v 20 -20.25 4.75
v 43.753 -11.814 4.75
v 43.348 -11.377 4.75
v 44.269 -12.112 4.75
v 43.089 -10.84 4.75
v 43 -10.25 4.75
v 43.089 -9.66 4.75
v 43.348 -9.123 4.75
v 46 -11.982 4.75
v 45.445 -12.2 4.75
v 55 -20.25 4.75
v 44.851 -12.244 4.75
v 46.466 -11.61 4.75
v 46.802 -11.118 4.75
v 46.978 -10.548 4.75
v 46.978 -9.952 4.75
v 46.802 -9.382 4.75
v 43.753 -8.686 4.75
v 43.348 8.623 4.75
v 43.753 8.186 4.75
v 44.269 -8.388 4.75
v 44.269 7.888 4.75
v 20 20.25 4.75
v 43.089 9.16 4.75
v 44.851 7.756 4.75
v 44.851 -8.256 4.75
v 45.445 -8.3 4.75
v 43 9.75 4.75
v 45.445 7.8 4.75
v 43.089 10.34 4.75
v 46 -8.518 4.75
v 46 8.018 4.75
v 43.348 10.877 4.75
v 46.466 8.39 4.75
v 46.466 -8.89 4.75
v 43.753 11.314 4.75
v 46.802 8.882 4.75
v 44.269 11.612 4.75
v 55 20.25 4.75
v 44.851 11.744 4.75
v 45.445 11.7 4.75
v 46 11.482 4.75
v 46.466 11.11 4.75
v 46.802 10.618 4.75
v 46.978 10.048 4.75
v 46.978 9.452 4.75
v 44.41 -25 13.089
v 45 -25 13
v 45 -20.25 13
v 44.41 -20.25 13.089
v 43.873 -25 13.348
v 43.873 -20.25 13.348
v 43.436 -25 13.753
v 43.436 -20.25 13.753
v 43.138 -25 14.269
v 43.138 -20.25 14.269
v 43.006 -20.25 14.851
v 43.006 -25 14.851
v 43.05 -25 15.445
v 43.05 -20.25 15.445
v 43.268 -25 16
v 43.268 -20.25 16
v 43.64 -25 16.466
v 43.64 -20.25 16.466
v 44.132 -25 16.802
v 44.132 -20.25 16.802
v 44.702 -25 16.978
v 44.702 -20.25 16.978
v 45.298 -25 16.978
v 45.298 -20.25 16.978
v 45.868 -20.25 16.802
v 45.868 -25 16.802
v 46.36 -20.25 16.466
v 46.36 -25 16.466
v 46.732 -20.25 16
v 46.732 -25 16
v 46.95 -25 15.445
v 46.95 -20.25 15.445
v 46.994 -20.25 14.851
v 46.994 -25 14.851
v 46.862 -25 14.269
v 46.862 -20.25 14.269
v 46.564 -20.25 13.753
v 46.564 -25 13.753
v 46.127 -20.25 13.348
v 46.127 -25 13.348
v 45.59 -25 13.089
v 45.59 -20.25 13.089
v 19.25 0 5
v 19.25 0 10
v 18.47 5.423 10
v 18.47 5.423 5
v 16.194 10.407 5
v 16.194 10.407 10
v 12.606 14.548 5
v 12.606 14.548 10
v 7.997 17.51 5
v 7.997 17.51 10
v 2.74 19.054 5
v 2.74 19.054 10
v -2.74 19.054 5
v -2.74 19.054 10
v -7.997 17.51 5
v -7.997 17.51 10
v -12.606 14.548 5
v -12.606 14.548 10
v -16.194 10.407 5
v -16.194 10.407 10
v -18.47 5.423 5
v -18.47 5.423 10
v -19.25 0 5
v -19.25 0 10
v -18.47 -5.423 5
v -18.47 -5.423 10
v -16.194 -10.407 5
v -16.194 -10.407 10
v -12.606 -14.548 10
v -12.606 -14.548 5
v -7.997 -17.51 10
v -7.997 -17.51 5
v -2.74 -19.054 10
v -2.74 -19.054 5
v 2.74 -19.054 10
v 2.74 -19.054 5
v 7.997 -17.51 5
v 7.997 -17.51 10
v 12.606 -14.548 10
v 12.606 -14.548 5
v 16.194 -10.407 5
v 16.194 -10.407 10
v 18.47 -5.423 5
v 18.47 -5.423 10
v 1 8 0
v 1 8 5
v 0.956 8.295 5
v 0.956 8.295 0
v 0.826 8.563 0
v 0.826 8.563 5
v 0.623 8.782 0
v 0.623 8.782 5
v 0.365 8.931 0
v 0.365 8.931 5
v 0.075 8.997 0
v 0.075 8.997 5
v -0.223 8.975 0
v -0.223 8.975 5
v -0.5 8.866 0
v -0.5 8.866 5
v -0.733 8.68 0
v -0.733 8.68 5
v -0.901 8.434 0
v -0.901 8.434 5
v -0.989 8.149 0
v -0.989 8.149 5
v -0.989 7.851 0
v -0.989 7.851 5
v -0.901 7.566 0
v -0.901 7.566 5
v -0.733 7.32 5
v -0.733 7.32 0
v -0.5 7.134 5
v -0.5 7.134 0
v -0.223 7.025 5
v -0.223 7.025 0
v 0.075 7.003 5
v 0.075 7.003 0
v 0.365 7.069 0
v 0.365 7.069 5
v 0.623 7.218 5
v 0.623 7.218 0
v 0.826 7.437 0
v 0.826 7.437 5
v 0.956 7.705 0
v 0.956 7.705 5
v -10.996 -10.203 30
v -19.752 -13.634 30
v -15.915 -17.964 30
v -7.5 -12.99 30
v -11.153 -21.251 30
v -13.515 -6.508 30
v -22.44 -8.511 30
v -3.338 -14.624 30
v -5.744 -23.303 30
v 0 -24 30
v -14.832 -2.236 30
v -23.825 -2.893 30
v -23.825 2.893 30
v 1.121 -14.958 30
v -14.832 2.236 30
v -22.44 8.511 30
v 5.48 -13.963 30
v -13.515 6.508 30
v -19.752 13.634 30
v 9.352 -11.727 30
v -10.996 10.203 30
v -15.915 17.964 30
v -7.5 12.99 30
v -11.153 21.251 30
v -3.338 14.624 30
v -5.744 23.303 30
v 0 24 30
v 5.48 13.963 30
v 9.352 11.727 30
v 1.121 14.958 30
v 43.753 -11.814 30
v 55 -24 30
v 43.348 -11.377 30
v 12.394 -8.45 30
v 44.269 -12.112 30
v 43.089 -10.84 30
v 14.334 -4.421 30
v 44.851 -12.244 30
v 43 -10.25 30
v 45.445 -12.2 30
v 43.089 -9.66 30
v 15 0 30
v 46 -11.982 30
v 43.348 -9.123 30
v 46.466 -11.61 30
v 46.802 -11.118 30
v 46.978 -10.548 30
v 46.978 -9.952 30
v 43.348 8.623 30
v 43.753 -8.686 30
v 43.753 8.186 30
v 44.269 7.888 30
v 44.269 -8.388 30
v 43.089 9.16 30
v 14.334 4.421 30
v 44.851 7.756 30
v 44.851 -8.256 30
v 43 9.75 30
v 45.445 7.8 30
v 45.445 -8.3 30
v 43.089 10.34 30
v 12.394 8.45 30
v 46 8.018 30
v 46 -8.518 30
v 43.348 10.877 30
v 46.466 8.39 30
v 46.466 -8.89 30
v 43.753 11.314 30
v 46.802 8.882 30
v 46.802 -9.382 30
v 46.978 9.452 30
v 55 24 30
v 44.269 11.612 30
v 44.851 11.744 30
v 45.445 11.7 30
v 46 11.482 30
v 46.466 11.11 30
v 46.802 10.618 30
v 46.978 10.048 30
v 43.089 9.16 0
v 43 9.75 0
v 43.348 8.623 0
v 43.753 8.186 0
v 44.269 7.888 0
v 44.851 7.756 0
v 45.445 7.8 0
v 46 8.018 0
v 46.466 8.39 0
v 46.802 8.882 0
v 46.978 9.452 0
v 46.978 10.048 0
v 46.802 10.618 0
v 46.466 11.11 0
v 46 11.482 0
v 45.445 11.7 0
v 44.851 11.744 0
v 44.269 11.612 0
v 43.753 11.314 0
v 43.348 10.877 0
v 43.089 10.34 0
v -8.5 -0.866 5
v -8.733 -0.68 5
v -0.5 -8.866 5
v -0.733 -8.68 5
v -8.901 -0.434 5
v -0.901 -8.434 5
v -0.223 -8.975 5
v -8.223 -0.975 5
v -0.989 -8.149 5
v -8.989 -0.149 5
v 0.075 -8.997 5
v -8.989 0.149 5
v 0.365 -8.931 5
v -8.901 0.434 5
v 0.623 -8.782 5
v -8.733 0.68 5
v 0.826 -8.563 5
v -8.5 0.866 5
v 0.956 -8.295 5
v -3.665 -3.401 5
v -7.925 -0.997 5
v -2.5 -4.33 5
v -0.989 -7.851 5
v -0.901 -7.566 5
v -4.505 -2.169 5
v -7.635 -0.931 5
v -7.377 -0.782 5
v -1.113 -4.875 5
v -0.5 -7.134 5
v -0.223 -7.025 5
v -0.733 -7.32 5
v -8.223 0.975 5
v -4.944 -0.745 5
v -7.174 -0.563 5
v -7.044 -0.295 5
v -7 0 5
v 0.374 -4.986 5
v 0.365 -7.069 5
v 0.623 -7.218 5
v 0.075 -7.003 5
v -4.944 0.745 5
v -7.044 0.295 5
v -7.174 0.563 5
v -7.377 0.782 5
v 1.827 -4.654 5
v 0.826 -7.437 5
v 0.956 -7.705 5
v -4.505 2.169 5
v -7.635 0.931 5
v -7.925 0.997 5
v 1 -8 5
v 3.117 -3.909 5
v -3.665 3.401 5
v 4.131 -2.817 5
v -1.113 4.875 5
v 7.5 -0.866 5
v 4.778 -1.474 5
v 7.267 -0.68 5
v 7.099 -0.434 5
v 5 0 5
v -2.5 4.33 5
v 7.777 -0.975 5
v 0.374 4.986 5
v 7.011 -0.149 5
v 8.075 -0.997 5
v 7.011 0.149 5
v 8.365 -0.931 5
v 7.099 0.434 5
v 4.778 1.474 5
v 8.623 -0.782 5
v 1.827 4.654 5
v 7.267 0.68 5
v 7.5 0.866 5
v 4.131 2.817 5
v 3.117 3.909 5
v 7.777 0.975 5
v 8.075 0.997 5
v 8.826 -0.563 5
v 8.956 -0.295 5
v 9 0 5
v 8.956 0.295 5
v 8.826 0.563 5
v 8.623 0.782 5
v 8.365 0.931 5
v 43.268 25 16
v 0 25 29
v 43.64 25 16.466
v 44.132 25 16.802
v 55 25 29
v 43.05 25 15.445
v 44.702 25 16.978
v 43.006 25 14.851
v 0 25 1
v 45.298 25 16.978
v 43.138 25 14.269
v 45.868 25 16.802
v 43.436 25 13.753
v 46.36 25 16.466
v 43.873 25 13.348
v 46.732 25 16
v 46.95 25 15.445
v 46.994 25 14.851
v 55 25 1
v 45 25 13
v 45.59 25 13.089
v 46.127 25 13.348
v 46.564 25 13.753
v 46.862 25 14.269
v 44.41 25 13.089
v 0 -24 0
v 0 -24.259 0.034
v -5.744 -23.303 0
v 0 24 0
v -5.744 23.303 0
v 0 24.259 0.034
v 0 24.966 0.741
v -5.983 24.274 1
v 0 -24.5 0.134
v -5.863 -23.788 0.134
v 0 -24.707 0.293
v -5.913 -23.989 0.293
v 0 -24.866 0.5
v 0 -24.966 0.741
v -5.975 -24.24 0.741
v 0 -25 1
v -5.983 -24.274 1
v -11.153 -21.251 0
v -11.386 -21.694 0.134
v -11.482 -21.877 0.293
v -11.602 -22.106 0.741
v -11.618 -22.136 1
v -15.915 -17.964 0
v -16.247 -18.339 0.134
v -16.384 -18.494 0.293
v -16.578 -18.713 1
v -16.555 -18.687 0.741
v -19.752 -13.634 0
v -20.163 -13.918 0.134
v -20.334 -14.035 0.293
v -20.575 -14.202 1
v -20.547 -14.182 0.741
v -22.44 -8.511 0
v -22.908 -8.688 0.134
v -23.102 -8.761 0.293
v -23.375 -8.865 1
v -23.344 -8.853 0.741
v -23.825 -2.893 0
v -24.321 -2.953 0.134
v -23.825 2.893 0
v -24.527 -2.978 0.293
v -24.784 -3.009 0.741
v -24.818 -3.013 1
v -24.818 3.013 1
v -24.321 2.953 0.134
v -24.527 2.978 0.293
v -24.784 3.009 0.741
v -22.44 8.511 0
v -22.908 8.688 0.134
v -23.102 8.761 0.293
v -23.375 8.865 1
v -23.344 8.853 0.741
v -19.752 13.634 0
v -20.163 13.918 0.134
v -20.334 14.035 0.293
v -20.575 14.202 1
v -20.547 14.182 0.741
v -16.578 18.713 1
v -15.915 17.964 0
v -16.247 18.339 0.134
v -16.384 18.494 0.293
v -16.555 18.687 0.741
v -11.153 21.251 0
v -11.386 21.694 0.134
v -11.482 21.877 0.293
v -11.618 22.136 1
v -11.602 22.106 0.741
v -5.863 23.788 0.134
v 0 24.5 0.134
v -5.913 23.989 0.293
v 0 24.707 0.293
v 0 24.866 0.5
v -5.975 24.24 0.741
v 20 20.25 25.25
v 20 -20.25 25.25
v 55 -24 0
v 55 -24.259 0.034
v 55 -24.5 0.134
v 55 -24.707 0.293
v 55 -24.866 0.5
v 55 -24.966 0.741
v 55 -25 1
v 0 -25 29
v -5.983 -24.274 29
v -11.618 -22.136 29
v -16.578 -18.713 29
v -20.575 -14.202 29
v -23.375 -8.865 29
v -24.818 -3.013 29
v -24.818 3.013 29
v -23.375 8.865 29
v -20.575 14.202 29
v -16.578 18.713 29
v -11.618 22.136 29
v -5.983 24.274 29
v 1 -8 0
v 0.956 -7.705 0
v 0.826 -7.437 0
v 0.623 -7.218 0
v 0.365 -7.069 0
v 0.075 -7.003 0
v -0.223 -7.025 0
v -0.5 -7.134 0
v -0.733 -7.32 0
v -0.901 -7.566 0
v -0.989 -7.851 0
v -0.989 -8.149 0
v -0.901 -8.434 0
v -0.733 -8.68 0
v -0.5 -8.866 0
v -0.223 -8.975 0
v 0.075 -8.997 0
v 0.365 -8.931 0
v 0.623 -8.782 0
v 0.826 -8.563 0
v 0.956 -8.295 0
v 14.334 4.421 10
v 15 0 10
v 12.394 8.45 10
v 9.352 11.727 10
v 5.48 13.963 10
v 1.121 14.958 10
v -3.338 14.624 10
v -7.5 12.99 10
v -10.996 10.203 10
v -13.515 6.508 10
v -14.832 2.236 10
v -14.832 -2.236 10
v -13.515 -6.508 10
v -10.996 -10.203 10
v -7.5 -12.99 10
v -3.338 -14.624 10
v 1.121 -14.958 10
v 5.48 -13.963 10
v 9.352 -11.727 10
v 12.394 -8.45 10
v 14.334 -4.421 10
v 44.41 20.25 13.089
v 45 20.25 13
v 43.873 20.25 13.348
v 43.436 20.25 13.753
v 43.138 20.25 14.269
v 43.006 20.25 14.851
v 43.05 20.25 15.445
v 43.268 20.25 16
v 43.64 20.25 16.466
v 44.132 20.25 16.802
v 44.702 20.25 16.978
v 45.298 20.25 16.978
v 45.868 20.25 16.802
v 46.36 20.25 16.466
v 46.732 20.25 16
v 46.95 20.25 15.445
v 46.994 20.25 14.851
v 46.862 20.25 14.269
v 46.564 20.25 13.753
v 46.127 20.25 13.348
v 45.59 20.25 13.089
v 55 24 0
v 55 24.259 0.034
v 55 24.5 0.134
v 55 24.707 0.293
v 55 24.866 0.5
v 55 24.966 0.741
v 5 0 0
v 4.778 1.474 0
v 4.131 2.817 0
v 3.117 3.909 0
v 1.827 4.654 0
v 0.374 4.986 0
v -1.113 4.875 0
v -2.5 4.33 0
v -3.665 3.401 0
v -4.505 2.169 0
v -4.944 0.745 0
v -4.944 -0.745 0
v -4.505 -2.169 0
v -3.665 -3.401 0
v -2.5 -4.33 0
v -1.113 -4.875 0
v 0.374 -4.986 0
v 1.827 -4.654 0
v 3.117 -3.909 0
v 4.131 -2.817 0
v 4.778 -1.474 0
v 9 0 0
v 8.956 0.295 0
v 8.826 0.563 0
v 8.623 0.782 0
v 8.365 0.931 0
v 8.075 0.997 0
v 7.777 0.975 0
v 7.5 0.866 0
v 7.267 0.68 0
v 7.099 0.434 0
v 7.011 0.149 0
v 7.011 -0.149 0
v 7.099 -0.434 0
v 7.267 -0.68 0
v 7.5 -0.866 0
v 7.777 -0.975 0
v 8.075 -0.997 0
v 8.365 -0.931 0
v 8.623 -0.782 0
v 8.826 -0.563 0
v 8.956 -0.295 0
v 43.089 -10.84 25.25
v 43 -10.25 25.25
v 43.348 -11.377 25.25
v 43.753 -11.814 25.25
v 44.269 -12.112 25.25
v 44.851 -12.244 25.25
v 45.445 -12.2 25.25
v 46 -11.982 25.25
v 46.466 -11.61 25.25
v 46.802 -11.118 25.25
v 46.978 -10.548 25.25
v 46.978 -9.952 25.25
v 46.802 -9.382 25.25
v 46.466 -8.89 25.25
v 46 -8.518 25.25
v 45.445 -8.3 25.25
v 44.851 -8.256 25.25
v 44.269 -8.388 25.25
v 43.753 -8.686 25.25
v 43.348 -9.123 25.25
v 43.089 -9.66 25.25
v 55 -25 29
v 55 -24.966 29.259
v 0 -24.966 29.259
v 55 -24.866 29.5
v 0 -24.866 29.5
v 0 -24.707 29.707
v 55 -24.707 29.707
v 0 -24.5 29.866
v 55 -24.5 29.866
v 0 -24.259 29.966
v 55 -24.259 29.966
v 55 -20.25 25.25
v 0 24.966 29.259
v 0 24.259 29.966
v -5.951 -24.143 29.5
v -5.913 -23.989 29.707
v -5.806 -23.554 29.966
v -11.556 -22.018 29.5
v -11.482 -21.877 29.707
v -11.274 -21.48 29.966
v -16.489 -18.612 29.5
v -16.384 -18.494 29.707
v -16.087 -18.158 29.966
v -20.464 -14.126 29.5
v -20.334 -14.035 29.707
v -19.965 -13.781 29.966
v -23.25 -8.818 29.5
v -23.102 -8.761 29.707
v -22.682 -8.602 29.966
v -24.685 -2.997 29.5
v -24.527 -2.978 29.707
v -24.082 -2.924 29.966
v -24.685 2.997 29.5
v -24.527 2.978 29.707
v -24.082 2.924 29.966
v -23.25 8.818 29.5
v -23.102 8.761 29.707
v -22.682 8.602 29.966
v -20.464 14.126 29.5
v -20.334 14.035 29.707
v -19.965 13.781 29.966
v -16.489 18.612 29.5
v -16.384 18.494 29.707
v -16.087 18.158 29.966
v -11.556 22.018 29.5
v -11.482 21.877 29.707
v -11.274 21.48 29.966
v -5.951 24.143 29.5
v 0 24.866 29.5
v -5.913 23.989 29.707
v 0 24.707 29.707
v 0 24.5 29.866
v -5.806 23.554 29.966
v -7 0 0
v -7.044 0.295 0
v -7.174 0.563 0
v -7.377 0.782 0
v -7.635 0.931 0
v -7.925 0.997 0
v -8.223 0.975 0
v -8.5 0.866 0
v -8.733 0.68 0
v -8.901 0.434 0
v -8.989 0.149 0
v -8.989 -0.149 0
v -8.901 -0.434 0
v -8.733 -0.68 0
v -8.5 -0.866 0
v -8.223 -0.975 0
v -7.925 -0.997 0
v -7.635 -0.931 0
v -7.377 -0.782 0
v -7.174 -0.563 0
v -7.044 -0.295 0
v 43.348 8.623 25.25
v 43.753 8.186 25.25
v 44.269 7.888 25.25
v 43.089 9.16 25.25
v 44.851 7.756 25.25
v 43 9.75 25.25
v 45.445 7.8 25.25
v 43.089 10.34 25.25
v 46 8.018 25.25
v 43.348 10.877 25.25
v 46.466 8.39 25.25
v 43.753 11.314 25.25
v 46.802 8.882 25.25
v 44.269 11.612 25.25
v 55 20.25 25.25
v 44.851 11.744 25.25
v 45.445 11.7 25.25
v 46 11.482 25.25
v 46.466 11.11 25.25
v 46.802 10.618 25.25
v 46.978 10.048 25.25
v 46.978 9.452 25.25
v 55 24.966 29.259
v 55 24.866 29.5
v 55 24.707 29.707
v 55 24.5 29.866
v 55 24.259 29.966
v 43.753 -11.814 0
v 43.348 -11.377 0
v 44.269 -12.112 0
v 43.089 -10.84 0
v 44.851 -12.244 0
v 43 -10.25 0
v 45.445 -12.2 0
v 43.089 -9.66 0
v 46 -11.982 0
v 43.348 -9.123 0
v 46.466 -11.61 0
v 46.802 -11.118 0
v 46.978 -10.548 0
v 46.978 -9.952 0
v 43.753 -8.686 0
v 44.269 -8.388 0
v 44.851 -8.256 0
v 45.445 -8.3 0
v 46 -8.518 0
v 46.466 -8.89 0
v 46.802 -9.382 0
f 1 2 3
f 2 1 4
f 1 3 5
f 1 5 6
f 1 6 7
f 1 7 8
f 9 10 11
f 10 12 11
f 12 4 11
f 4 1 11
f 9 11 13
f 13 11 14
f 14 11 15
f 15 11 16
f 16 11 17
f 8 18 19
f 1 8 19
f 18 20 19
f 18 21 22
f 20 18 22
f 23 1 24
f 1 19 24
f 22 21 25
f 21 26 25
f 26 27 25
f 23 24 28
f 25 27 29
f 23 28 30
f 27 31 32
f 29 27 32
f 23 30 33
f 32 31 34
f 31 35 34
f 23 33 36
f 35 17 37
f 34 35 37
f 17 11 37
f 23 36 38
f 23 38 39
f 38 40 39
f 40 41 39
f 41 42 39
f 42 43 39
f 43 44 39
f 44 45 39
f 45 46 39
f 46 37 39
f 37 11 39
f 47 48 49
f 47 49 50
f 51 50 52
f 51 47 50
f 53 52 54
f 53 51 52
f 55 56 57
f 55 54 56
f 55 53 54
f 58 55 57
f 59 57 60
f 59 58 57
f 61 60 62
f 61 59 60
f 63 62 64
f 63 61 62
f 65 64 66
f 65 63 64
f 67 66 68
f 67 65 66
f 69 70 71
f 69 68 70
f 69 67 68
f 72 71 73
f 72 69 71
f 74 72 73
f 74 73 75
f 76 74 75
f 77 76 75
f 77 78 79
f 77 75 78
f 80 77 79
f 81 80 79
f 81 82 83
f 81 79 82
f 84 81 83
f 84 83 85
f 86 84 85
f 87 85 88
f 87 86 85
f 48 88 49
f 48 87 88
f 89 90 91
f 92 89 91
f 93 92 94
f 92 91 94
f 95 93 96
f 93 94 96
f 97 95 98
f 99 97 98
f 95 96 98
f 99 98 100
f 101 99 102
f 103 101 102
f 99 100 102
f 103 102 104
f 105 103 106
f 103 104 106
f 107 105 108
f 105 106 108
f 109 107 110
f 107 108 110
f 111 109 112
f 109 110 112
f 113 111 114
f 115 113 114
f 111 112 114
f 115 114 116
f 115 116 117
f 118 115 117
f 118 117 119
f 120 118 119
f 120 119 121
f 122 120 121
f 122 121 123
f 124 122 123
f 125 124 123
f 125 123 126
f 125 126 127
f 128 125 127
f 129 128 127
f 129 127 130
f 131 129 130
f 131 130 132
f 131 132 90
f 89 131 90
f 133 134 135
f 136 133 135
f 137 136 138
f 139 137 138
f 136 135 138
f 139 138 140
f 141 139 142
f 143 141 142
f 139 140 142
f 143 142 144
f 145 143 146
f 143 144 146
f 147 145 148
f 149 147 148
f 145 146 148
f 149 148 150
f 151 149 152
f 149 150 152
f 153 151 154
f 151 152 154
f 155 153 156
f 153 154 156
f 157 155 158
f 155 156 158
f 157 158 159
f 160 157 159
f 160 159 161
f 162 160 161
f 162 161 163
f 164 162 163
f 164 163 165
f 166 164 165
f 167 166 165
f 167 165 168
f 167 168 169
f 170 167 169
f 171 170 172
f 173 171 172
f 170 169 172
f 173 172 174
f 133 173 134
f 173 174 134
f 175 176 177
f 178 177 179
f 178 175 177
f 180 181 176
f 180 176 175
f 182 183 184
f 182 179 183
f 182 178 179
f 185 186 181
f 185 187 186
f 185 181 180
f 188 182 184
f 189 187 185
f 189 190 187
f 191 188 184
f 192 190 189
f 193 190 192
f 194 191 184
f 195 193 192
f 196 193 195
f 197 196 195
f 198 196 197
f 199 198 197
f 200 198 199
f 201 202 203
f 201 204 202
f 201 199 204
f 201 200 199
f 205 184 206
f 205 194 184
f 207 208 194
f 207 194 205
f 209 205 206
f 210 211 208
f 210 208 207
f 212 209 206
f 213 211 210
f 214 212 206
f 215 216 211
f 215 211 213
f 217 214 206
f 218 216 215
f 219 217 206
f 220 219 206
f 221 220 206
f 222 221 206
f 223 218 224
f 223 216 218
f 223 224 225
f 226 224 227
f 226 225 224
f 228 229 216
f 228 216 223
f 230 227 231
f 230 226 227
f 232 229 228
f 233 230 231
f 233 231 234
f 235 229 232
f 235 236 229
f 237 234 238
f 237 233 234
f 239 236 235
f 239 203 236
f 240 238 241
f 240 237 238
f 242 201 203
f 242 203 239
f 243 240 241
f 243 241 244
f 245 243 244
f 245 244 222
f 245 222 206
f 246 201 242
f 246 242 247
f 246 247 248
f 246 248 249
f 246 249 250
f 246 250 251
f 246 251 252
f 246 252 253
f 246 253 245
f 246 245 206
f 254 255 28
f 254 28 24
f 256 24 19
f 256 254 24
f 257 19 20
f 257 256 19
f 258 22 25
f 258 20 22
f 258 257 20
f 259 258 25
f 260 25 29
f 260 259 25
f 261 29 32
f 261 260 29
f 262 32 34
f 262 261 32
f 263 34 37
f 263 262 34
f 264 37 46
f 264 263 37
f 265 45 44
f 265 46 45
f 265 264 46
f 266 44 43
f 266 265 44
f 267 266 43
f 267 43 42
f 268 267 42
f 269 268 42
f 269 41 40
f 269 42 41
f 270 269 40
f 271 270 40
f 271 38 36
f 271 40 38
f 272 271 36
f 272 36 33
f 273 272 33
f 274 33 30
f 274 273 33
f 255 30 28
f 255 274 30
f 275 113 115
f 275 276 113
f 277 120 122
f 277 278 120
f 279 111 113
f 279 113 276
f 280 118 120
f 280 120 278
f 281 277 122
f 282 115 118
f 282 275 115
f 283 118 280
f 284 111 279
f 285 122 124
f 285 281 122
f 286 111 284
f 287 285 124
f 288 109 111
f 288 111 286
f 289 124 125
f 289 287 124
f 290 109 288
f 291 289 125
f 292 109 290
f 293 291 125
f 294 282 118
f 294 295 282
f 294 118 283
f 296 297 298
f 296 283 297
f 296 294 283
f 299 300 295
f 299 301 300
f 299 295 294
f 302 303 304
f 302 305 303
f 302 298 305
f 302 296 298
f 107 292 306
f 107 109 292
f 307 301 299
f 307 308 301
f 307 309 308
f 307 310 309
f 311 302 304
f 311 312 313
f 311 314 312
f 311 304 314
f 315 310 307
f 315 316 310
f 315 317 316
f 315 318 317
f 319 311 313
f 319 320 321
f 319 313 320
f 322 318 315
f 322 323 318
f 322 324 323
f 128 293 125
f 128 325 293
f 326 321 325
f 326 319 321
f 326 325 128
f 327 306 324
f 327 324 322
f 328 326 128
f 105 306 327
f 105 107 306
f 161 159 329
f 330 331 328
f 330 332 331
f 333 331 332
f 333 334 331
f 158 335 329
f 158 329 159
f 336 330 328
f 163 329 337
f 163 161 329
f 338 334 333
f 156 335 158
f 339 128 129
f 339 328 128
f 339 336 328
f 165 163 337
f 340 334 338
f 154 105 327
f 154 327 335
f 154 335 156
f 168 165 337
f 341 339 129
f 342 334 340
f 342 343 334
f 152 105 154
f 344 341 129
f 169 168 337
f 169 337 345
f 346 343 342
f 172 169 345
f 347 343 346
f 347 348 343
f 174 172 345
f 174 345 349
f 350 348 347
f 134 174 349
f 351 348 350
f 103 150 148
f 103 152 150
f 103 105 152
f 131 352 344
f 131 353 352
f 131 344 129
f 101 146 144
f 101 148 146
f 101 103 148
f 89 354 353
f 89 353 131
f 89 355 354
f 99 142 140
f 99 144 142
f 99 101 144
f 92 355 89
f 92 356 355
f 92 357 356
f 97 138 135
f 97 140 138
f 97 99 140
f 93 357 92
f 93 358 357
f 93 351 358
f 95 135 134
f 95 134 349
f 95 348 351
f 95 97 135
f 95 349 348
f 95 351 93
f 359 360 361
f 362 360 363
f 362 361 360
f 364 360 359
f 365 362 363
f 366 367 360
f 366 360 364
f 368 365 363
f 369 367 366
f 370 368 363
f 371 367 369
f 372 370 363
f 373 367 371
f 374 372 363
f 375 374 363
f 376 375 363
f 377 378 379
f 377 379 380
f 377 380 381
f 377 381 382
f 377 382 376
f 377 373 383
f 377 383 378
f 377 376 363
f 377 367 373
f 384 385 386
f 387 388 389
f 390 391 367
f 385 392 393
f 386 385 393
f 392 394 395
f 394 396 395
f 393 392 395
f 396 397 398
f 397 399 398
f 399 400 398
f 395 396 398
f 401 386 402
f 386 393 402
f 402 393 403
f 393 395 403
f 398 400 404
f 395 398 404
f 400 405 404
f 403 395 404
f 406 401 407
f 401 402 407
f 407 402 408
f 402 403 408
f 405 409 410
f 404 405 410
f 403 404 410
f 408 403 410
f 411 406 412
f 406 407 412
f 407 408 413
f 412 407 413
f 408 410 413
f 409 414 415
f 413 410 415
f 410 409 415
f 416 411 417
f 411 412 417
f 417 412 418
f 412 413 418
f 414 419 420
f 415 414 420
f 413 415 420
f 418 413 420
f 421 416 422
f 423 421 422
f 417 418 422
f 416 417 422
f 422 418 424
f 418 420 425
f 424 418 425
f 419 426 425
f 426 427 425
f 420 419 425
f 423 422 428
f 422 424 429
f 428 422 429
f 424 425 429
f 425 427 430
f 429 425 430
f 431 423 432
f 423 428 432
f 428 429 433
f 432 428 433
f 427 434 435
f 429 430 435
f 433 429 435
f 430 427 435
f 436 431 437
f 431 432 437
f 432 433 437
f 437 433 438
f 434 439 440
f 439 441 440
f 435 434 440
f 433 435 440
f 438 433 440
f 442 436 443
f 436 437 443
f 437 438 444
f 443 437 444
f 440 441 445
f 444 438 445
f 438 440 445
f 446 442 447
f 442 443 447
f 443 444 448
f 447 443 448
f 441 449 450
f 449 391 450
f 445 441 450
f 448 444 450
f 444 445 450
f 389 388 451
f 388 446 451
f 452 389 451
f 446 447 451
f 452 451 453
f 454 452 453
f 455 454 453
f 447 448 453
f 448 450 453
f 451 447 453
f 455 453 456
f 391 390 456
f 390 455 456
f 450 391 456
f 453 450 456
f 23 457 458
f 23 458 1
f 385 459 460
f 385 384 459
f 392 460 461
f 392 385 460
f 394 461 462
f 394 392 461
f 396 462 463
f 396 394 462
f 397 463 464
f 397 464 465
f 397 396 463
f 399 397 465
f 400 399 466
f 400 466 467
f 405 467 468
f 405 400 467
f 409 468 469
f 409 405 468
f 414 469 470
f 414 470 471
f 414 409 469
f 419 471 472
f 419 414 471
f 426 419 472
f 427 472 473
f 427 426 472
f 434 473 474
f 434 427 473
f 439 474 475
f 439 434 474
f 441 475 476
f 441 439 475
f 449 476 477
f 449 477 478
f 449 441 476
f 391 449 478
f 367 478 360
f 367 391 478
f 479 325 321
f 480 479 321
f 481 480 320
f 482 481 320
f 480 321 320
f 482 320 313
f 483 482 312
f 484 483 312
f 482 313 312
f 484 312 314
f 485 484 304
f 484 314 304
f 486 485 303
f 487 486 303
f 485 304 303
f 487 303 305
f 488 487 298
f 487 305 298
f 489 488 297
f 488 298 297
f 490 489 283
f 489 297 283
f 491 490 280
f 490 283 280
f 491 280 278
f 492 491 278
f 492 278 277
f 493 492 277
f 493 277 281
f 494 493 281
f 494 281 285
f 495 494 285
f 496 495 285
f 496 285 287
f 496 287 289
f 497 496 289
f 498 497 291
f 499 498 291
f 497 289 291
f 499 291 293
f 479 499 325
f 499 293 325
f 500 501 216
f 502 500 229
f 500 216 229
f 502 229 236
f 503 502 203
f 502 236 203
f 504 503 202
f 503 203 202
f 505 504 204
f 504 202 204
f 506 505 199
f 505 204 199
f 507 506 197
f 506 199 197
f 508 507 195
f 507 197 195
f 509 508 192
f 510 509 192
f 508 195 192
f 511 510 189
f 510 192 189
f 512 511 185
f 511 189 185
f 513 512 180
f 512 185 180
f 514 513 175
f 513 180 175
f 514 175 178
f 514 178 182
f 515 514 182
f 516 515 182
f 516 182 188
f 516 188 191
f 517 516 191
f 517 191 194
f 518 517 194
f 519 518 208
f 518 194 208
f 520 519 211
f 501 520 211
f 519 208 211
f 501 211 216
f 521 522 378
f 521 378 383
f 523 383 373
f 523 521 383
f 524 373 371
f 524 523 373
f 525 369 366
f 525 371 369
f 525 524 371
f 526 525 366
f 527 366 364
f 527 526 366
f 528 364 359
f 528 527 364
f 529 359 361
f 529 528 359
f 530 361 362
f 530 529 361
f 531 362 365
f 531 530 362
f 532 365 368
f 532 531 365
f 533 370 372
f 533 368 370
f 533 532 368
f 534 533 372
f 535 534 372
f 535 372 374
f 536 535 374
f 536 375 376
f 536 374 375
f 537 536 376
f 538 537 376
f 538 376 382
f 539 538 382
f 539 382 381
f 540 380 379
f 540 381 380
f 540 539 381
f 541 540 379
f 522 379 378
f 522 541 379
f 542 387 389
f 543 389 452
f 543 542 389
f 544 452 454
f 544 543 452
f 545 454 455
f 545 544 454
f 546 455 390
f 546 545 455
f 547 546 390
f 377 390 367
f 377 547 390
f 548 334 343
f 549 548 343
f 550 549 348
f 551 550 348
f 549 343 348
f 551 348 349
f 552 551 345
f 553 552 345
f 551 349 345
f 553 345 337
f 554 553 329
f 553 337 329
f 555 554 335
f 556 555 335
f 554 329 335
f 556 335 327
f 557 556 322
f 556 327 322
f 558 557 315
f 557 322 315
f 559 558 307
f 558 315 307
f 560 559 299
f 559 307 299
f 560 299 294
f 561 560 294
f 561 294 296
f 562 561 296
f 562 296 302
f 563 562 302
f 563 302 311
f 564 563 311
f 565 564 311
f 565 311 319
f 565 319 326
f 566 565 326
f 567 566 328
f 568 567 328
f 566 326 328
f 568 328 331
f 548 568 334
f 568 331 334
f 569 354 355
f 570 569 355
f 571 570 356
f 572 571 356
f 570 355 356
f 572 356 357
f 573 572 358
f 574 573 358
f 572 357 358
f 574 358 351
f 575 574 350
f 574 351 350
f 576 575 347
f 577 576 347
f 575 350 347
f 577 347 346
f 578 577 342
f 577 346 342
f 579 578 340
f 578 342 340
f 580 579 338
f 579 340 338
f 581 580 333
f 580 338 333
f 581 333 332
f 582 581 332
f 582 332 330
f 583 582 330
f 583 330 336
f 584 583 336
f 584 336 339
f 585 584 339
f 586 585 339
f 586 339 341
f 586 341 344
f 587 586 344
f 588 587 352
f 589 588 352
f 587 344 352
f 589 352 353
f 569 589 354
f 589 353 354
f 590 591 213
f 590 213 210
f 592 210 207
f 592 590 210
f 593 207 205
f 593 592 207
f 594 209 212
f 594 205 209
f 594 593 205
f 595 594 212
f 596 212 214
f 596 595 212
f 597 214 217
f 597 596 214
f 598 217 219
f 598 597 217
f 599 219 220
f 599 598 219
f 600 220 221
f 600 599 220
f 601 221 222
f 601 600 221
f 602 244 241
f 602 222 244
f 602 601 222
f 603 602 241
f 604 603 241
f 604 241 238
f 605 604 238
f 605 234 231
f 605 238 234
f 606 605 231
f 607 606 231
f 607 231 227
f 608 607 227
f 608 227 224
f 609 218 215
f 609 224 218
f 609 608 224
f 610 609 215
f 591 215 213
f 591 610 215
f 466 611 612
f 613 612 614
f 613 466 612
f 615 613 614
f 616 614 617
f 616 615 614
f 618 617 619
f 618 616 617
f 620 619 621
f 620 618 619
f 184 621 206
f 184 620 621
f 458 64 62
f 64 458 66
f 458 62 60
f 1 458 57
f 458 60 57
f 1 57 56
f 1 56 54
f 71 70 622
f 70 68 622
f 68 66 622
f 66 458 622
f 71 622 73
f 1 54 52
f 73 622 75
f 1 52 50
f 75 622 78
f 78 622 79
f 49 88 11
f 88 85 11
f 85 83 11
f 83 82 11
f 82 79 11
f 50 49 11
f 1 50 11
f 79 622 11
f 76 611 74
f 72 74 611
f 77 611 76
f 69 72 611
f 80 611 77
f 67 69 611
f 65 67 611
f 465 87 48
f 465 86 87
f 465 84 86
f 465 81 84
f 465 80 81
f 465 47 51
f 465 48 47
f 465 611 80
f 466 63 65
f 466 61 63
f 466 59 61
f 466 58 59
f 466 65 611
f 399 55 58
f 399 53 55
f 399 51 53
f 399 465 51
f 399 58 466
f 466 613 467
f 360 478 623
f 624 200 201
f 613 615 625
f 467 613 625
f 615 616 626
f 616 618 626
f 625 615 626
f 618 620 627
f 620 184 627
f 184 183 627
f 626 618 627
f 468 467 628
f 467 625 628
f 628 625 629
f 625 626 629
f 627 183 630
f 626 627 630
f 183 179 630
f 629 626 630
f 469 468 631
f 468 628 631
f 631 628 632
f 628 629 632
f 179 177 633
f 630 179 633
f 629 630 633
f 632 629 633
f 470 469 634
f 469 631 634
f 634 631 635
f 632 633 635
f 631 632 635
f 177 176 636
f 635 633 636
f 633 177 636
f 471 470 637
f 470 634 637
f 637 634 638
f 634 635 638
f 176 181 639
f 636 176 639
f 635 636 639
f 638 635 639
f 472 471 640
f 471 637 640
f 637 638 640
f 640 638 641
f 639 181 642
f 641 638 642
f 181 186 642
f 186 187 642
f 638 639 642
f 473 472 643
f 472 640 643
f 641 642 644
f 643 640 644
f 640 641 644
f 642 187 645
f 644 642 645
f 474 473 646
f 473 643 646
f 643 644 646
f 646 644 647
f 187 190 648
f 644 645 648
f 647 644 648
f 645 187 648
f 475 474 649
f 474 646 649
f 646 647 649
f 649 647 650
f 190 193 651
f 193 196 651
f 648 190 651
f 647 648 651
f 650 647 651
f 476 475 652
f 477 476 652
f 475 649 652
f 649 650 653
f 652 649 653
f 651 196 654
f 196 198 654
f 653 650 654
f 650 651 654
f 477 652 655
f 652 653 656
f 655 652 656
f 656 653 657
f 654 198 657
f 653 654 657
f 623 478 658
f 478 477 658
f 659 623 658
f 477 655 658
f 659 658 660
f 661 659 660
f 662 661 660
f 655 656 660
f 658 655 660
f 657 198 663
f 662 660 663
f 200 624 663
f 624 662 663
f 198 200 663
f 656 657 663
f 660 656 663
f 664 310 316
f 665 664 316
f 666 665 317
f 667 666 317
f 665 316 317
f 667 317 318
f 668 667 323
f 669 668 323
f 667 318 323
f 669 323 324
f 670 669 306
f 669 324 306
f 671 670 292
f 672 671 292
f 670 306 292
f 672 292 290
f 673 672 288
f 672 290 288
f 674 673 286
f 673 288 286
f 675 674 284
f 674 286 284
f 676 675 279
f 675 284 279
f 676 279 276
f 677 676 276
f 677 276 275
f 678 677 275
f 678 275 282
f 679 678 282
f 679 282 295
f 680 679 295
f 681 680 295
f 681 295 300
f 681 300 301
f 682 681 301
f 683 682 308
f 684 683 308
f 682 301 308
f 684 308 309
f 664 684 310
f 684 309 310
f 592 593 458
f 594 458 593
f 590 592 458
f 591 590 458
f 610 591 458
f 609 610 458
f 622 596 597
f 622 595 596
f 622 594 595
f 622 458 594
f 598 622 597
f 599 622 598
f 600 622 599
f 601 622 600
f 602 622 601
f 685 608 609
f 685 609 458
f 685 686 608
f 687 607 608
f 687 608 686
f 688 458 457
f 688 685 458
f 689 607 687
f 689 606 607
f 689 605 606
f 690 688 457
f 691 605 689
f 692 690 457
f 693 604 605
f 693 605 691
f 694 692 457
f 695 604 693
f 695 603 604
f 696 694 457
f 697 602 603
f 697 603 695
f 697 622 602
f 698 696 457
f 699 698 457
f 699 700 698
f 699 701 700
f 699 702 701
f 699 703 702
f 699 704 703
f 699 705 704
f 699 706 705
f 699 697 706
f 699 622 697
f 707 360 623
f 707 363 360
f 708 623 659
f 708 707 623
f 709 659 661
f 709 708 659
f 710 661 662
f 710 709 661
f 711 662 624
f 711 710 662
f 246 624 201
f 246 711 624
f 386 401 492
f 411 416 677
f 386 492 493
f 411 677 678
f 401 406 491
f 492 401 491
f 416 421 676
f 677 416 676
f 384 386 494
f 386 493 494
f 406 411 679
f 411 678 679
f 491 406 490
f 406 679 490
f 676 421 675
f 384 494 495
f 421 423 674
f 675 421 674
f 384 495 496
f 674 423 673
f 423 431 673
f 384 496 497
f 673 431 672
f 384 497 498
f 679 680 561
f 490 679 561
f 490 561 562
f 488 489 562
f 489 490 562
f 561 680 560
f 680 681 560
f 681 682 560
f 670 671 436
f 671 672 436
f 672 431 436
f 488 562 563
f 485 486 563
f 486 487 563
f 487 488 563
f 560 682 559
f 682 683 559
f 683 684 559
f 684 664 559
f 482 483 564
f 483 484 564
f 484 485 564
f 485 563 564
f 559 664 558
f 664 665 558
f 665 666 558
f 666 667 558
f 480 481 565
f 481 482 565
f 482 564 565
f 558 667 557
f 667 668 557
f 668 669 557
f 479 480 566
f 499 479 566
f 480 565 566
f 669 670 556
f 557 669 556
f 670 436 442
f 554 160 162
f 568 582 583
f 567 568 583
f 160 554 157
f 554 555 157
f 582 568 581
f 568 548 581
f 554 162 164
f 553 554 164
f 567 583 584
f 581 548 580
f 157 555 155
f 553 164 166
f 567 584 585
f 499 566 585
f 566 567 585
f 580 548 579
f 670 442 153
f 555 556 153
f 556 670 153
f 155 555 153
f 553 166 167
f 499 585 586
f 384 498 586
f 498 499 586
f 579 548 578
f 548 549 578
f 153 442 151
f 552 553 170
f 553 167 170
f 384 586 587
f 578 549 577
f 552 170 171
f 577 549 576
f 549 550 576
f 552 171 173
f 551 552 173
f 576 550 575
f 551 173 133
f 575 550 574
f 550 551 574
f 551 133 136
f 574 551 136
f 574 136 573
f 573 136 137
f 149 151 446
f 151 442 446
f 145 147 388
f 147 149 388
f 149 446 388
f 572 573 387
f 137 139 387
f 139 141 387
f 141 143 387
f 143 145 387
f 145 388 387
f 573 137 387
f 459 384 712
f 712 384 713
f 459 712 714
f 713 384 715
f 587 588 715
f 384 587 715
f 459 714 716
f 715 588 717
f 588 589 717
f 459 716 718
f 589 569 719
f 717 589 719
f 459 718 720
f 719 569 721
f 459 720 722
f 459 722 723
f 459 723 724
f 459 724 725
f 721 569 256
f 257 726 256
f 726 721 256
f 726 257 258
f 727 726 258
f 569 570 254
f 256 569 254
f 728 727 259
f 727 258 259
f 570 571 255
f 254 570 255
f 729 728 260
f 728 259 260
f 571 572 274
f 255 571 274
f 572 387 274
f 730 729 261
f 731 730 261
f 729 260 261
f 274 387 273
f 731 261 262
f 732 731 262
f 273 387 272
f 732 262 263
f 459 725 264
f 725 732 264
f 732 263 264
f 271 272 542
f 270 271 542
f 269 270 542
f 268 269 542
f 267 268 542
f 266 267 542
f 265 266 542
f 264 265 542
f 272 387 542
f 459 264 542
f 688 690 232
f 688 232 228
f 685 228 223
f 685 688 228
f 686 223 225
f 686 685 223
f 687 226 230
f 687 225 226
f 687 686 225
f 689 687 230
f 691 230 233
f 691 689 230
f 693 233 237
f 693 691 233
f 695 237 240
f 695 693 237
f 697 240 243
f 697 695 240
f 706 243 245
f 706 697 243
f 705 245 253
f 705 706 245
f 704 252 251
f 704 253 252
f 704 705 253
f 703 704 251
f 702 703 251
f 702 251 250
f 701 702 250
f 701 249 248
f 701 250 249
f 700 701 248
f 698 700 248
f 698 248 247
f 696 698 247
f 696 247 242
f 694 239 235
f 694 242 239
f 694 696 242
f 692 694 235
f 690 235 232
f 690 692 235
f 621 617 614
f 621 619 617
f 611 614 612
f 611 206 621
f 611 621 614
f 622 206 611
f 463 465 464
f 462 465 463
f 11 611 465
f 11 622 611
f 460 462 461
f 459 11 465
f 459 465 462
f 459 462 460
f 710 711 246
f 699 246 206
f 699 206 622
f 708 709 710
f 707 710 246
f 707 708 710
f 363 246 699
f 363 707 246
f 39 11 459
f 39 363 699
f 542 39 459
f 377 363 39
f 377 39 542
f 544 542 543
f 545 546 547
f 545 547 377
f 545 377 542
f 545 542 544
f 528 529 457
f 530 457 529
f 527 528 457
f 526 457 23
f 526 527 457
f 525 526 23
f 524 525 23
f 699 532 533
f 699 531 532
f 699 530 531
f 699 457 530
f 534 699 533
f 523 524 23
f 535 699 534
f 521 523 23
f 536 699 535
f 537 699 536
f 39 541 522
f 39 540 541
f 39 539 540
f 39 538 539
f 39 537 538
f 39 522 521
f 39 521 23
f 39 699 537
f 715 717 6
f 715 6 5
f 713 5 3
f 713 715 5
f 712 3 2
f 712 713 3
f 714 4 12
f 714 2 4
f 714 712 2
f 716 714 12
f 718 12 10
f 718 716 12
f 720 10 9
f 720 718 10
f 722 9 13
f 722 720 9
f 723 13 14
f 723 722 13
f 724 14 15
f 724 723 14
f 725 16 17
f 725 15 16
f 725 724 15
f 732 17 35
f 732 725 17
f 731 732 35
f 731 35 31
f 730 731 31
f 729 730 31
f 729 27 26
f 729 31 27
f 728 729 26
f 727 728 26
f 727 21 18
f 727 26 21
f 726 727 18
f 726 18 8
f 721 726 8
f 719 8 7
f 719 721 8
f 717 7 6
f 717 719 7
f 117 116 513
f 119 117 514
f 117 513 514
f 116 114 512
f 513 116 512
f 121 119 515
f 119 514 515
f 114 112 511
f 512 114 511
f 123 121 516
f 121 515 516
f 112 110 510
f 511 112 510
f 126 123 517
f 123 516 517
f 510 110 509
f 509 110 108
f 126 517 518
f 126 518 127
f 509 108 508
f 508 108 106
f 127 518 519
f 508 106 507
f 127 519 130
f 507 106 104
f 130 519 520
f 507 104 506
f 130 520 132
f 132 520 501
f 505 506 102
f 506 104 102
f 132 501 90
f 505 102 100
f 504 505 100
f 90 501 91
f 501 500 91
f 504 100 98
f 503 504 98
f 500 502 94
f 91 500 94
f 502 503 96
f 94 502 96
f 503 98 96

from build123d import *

# Parameters (mm, degrees)
BOSS_EXTRUDE2_DEPTH      = 30
SKETCH3_R                = 6.5
CUT_EXTRUDE2_DEPTH       = 40
SKETCH4_R                = 19
CUT_EXTRUDE3_DEPTH       = 25
SKETCH2_W                = 20.5
SKETCH2_H                = 40.5
CUT_EXTRUDE5_DEPTH       = 50
SKETCH6_R                = 6.75
CUT_EXTRUDE6_DEPTH       = 50
SKETCH7_R                = 19.25
CUT_EXTRUDE7_DEPTH       = 25
SKETCH8_W                = 30
SKETCH8_H                = 50
CUT_EXTRUDE8_DEPTH       = 15
CUT_EXTRUDE9_DEPTH       = 100
CUT_EXTRUDE9_DEPTH_BACK  = 15
SKETCH9_R                = 2
CUT_EXTRUDE10_DEPTH      = 100
CUT_EXTRUDE10_DEPTH_BACK = 15
SKETCH10_R               = 2
FILLET1_R                = 1
SKETCH12_R               = 6.75
SKETCH12_R_2             = 5
BOSS_EXTRUDE3_DEPTH      = 5
SKETCH13_R               = 1
CUT_EXTRUDE11_DEPTH      = 5
SKETCH14_R               = 19.25
SKETCH14_R_2             = 15
BOSS_EXTRUDE4_DEPTH      = 20


with BuildPart() as part:
    # Sketch1 → Boss-Extrude2 (new body)
    with BuildSketch(Plane.XY):
        with BuildLine():
            Line((0, 25), (70, 25))
            Line((70, 25), (70, -25))
            Line((70, -25), (0, -25))
            ThreePointArc((0, -25), (-25, 0), (0, 25))
        make_face()
    extrude(amount=BOSS_EXTRUDE2_DEPTH)

    # Sketch3 → Cut-Extrude2 (cut)
    with BuildSketch(Plane.XY.offset(30)):
        Circle(SKETCH3_R)
    extrude(amount=-CUT_EXTRUDE2_DEPTH, mode=Mode.SUBTRACT)

    # Sketch4 → Cut-Extrude3 (cut)
    with BuildSketch(Plane.XY.offset(30)):
        Circle(SKETCH4_R)
    extrude(amount=-CUT_EXTRUDE3_DEPTH, mode=Mode.SUBTRACT)

    # Sketch2 → Cut-Extrude5 (cut)
    with BuildSketch(Plane(origin=(70, 0, 0), x_dir=(0, 0, -1), z_dir=(1, 0, 0))):
        with Locations((-15, 0)):
            Rectangle(SKETCH2_W, SKETCH2_H)
    extrude(amount=-CUT_EXTRUDE5_DEPTH, mode=Mode.SUBTRACT)

    # Sketch6 → Cut-Extrude6 (cut)
    with BuildSketch(Plane.XY.offset(30)):
        Circle(SKETCH6_R)
    extrude(amount=-CUT_EXTRUDE6_DEPTH, mode=Mode.SUBTRACT)

    # Sketch7 → Cut-Extrude7 (cut)
    with BuildSketch(Plane.XY.offset(30)):
        Circle(SKETCH7_R)
    extrude(amount=-CUT_EXTRUDE7_DEPTH, mode=Mode.SUBTRACT)

    # Sketch8 → Cut-Extrude8 (cut)
    with BuildSketch(Plane(origin=(70, 0, 0), x_dir=(0, 0, -1), z_dir=(1, 0, 0))):
        with Locations((-15, 0)):
            Rectangle(SKETCH8_W, SKETCH8_H)
    extrude(amount=-CUT_EXTRUDE8_DEPTH, mode=Mode.SUBTRACT)

    # Sketch9 → Cut-Extrude9 (cut, two sides: drawn at the far end of the back side and taken through both)
    with BuildSketch(Plane.XY.offset(4.75).offset(-CUT_EXTRUDE9_DEPTH_BACK)):
        with Locations(Location((45, -10.25, 0), (0, 0, 180))):
            Circle(SKETCH9_R)
        with Locations(Location((45, 9.75, 0), (0, 0, 180))):
            Circle(SKETCH9_R)
    extrude(amount=CUT_EXTRUDE9_DEPTH + CUT_EXTRUDE9_DEPTH_BACK, mode=Mode.SUBTRACT)

    # Sketch10 → Cut-Extrude10 (cut, two sides: drawn at the far end of the back side and taken through both)
    with BuildSketch(Plane(origin=(0, -20.25, 0), x_dir=(1, 0, 0), z_dir=(0, 1, 0)).offset(-CUT_EXTRUDE10_DEPTH_BACK)):
        with Locations(Location((45, -15, 0), (0, 0, 90))):
            Circle(SKETCH10_R)
    extrude(amount=CUT_EXTRUDE10_DEPTH + CUT_EXTRUDE10_DEPTH_BACK, mode=Mode.SUBTRACT)

    # Fillet1
    fillet1_edges = [part.edges().sort_by_distance(p)[0] for p in [
        (-25, 0, 30),
        (27.5, -25, 0),
        (27.5, 25, 0),
        (27.5, 25, 30),
        (-25, 0, 0),
        (27.5, -25, 30),
    ]]
    fillet(fillet1_edges, radius=FILLET1_R)

    # Sketch12 → Boss-Extrude3 (add)
    with BuildSketch(Plane.XY.offset(5)):
        Circle(SKETCH12_R)
        Circle(SKETCH12_R_2, mode=Mode.SUBTRACT)
    extrude(amount=-BOSS_EXTRUDE3_DEPTH)

    # Sketch13 → Cut-Extrude11 (cut)
    with BuildSketch(Plane.XY.offset(5)):
        with Locations((-8, 0)):
            Circle(SKETCH13_R)
        with Locations((0, 8)):
            Circle(SKETCH13_R)
        with Locations((8, 0)):
            Circle(SKETCH13_R)
        with Locations((0, -8)):
            Circle(SKETCH13_R)
    extrude(amount=-CUT_EXTRUDE11_DEPTH, mode=Mode.SUBTRACT)

    # Sketch14 → Boss-Extrude4 (add)
    with BuildSketch(Plane.XY.offset(30)):
        Circle(SKETCH14_R)
        Circle(SKETCH14_R_2, mode=Mode.SUBTRACT)
    extrude(amount=-BOSS_EXTRUDE4_DEPTH)


solid = part.part
